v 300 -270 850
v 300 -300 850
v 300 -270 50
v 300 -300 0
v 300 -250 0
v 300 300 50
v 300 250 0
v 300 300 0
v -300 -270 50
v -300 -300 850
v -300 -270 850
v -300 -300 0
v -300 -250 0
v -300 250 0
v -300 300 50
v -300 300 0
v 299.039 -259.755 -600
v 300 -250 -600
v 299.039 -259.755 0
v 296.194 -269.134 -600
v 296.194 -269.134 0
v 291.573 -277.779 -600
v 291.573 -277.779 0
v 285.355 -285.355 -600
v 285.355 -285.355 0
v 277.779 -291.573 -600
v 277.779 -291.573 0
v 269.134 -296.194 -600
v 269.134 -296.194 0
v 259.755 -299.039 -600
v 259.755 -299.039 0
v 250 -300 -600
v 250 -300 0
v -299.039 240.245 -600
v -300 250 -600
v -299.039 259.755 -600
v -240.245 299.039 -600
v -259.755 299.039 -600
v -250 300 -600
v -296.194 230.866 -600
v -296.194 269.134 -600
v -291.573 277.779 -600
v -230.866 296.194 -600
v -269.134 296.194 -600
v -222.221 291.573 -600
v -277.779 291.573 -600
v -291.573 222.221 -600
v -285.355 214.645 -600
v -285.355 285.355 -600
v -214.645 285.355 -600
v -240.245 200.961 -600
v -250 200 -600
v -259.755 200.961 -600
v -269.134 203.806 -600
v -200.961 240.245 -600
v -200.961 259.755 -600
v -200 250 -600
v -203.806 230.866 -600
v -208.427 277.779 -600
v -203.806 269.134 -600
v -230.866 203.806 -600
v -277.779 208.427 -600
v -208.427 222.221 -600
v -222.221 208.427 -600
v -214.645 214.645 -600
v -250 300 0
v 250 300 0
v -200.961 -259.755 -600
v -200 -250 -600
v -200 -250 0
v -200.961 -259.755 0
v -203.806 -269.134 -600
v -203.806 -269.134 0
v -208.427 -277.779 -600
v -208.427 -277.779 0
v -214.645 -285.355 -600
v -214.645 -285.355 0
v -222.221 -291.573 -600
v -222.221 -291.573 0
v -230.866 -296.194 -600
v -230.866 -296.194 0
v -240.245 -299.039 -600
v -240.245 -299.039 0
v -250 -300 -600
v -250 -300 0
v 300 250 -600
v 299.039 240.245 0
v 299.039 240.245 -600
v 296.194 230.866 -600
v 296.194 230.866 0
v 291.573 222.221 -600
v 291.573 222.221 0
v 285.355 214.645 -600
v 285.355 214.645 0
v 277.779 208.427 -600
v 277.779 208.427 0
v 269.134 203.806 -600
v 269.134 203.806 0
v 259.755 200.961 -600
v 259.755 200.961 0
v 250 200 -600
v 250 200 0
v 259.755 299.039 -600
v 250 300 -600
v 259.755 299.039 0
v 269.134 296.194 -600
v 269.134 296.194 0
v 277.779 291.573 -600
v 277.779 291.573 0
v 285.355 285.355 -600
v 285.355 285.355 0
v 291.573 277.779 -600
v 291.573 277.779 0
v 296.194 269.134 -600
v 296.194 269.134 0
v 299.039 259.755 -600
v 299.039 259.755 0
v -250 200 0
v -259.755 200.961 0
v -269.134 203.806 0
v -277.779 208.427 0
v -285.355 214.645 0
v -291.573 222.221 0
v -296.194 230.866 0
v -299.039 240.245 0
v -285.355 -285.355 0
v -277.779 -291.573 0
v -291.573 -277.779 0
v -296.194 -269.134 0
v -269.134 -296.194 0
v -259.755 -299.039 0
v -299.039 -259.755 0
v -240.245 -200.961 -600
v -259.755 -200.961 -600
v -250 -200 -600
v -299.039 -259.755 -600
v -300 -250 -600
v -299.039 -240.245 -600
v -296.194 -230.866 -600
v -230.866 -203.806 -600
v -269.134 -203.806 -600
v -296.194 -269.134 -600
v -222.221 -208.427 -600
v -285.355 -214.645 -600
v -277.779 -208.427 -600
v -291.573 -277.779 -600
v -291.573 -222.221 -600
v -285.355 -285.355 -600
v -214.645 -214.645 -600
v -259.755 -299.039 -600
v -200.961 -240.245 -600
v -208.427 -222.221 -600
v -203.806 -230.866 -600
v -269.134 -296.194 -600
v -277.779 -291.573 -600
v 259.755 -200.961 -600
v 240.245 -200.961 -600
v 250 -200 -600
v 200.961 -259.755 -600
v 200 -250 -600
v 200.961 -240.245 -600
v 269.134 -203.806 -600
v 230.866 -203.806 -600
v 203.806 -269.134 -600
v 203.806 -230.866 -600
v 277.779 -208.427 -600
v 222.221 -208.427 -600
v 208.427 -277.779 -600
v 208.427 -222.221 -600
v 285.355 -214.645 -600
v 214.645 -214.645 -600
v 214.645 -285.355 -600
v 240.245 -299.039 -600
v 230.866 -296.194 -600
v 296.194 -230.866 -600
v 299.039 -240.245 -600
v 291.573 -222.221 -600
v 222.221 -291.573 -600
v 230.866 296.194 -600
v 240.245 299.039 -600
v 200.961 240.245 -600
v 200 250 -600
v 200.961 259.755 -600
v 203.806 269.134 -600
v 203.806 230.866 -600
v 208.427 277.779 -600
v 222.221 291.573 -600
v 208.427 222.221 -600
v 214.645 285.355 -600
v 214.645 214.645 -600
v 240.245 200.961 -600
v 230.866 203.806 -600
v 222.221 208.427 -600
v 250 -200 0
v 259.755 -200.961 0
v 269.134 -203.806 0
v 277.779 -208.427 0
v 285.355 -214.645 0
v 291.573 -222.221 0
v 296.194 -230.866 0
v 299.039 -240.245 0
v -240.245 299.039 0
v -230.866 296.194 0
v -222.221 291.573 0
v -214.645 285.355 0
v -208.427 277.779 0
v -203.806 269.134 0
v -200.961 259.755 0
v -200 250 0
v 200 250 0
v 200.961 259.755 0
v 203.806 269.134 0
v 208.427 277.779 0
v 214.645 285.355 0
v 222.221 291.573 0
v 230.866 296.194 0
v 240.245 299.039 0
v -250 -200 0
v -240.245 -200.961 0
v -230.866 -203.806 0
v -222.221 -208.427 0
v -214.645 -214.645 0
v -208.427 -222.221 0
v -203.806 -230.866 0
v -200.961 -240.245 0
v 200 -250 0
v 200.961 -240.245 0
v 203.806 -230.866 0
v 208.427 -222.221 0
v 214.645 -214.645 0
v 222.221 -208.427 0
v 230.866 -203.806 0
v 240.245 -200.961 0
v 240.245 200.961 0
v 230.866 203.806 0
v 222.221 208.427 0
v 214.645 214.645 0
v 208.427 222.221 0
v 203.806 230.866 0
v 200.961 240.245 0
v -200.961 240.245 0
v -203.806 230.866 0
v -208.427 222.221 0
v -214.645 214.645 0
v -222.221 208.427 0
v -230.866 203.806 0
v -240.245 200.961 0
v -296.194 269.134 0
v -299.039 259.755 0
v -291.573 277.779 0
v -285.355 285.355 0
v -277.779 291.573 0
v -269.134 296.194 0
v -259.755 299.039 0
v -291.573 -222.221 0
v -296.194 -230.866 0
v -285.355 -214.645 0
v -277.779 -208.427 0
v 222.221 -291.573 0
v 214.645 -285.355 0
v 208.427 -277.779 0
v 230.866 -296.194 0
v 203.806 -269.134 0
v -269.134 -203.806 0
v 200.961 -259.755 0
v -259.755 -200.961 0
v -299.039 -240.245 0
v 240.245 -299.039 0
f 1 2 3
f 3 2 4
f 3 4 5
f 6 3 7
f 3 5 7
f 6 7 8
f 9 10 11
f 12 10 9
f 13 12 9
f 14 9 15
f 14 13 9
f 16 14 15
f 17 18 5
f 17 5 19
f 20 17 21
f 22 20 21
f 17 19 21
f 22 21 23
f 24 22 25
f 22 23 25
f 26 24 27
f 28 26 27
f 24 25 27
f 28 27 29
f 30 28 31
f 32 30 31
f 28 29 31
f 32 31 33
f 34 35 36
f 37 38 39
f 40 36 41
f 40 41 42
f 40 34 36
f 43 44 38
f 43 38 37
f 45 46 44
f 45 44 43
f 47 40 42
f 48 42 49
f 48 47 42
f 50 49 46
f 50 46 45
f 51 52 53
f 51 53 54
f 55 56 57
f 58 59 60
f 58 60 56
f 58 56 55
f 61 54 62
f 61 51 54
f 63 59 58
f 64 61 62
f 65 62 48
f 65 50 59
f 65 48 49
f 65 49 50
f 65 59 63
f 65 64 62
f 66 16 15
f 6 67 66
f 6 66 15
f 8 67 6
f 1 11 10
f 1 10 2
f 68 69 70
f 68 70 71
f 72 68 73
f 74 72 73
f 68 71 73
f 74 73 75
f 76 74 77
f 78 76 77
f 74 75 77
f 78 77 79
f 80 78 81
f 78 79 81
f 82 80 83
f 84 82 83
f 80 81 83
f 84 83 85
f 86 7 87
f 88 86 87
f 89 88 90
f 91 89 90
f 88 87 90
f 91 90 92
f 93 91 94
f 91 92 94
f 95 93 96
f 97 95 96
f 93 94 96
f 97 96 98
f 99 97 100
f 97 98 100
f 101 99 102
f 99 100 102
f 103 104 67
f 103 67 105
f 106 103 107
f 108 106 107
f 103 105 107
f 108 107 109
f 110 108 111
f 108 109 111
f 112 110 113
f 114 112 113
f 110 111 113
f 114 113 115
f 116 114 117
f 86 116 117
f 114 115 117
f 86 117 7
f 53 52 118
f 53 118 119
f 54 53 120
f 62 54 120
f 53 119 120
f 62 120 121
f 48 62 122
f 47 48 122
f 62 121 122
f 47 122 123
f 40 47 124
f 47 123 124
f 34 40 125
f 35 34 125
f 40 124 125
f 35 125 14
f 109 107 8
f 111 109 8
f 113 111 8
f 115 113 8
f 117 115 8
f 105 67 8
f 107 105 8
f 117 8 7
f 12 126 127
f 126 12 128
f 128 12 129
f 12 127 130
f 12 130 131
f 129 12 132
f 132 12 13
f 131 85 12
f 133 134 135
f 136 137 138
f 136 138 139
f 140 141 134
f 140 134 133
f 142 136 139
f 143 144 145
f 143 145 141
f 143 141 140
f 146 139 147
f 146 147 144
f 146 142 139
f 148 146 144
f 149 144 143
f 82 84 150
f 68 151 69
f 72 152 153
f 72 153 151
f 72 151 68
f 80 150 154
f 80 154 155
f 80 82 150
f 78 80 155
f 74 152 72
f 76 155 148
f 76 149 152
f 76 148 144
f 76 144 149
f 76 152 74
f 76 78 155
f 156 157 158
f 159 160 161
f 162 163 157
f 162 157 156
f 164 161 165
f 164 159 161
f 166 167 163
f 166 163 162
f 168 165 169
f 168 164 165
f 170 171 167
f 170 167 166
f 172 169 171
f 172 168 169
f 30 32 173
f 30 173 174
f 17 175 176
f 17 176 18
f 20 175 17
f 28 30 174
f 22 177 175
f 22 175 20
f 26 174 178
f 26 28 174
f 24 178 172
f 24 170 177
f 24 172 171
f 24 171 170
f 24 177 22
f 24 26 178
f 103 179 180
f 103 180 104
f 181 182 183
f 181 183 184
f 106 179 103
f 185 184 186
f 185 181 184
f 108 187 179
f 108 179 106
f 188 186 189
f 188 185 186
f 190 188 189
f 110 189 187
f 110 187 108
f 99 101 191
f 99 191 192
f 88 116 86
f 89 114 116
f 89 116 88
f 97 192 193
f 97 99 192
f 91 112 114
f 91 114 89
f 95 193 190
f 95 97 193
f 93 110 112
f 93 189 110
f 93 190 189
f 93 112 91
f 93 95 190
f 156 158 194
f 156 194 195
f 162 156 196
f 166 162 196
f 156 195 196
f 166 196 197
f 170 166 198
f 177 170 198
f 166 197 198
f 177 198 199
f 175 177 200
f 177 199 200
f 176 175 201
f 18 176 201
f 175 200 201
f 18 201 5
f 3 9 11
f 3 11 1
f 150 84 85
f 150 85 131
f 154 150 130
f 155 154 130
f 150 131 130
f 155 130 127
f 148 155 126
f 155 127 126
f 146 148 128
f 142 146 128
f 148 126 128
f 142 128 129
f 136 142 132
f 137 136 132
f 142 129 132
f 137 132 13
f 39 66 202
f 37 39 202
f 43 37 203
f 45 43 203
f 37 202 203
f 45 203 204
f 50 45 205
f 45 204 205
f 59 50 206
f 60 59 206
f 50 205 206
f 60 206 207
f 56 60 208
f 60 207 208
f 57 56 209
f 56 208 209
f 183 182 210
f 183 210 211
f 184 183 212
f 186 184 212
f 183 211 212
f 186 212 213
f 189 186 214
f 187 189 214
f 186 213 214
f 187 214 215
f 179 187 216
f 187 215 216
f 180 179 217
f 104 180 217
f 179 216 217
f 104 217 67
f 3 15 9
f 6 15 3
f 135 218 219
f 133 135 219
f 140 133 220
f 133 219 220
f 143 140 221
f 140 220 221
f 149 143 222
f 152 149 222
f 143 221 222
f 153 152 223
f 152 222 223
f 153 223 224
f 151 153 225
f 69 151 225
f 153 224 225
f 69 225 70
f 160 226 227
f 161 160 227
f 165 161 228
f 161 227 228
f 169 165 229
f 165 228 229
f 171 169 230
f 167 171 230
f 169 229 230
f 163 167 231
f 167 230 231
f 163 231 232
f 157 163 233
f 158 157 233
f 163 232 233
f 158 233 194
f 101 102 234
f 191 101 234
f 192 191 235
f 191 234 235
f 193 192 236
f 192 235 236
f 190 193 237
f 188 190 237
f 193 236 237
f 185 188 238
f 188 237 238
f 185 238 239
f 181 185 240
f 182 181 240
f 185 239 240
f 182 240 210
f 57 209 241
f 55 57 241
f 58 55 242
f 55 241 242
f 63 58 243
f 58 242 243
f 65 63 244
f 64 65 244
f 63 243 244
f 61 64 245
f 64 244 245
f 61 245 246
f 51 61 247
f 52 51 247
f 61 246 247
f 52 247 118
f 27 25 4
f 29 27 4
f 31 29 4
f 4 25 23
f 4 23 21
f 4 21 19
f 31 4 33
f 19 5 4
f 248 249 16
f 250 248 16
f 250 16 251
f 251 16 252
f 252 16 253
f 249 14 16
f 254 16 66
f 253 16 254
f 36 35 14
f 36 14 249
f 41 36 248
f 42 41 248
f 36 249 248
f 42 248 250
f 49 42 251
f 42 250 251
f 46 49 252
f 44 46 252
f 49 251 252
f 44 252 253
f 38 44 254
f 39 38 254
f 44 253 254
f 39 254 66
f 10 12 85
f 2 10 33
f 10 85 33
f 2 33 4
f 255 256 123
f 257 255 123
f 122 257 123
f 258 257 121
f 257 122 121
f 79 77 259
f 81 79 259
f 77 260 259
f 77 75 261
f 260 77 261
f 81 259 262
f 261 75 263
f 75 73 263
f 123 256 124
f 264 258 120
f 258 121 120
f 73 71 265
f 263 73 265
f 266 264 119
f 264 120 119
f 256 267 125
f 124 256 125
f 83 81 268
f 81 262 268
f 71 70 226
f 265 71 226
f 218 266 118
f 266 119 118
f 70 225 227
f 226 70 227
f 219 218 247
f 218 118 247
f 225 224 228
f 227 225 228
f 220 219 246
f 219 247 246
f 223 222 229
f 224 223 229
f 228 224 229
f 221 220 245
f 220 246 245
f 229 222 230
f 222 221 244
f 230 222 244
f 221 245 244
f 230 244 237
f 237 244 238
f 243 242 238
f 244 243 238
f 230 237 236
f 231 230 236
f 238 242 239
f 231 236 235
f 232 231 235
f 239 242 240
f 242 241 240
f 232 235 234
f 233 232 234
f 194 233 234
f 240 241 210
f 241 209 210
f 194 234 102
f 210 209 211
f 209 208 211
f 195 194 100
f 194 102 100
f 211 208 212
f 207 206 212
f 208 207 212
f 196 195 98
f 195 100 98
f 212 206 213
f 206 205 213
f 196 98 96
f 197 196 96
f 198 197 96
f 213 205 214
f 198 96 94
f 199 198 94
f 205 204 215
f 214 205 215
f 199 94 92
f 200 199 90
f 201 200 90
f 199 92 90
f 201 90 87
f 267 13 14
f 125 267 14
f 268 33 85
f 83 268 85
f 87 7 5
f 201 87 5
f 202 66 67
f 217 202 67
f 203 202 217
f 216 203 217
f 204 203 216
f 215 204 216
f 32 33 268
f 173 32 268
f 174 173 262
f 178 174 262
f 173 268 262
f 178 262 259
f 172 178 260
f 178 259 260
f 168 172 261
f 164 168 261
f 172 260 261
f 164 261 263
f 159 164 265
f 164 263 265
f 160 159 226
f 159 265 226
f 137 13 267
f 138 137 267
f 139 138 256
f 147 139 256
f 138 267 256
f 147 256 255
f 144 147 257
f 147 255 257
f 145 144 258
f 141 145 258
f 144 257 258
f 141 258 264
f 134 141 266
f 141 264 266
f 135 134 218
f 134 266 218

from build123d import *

# Parameters (mm, degrees)
F0_W     = 600
F0_H     = 600
F1_DEPTH = 50
F2_W     = 600
F2_H     = 30
F3_DEPTH = 800
F5_DEPTH = 600


with BuildPart() as f1:
    # F0 (on Top) → F1 (new body)
    with BuildSketch(Plane.XY):
        Rectangle(F0_W, F0_H)
    extrude(amount=F1_DEPTH)

    # F2 (on face) → F3 (join)
    with BuildSketch(Plane.XY.offset(50)):
        with Locations((0, -285)):
            Rectangle(F2_W, F2_H)
    extrude(amount=F3_DEPTH)

    # F4 (on face) → F5 (join)
    with BuildSketch(Plane(origin=(0, 0, 0), x_dir=(1, 0, 0), z_dir=(0, 0, -1))):
        with BuildLine():
            Line((-250, 250), (-200, 250))
            ThreePointArc((-200, 250), (-214.644661, 285.355339), (-250, 300))
            ThreePointArc((-250, 300), (-285.355339, 285.355339), (-300, 250))
            ThreePointArc((-300, 250), (-285.355339, 214.644661), (-250, 200))
            Line((-250, 200), (-250, 250))
        make_face()
        with BuildLine():
            ThreePointArc((-250, 200), (-214.644661, 214.644661), (-200, 250))
            Line((-200, 250), (-250, 250))
            Line((-250, 250), (-250, 200))
        make_face()
        with BuildLine():
            ThreePointArc((250, 300), (214.644661, 285.355339), (200, 250))
            Line((200, 250), (250, 250))
            Line((250, 250), (250, 200))
            ThreePointArc((250, 200), (285.355339, 214.644661), (300, 250))
            ThreePointArc((300, 250), (285.355339, 285.355339), (250, 300))
        make_face()
        with BuildLine():
            ThreePointArc((-200, -250), (-214.644661, -214.644661), (-250, -200))
            Line((-250, -200), (-250, -250))
            Line((-250, -250), (-200, -250))
        make_face()
        with BuildLine():
            Line((-250, -250), (-250, -200))
            ThreePointArc((-250, -200), (-285.355339, -214.644661), (-300, -250))
            ThreePointArc((-300, -250), (-285.355339, -285.355339), (-250, -300))
            ThreePointArc((-250, -300), (-214.644661, -285.355339), (-200, -250))
            Line((-200, -250), (-250, -250))
        make_face()
        with BuildLine():
            Line((250, -250), (250, -200))
            ThreePointArc((250, -200), (214.644661, -214.644661), (200, -250))
            Line((200, -250), (250, -250))
        make_face()
        with BuildLine():
            ThreePointArc((300, -250), (285.355339, -214.644661), (250, -200))
            Line((250, -200), (250, -250))
            Line((250, -250), (200, -250))
            ThreePointArc((200, -250), (214.644661, -285.355339), (250, -300))
            ThreePointArc((250, -300), (285.355339, -285.355339), (300, -250))
        make_face()
        with BuildLine():
            Line((250, 250), (200, 250))
            ThreePointArc((200, 250), (214.644661, 214.644661), (250, 200))
            Line((250, 200), (250, 250))
        make_face()
    extrude(amount=F5_DEPTH)


solid = f1.part
